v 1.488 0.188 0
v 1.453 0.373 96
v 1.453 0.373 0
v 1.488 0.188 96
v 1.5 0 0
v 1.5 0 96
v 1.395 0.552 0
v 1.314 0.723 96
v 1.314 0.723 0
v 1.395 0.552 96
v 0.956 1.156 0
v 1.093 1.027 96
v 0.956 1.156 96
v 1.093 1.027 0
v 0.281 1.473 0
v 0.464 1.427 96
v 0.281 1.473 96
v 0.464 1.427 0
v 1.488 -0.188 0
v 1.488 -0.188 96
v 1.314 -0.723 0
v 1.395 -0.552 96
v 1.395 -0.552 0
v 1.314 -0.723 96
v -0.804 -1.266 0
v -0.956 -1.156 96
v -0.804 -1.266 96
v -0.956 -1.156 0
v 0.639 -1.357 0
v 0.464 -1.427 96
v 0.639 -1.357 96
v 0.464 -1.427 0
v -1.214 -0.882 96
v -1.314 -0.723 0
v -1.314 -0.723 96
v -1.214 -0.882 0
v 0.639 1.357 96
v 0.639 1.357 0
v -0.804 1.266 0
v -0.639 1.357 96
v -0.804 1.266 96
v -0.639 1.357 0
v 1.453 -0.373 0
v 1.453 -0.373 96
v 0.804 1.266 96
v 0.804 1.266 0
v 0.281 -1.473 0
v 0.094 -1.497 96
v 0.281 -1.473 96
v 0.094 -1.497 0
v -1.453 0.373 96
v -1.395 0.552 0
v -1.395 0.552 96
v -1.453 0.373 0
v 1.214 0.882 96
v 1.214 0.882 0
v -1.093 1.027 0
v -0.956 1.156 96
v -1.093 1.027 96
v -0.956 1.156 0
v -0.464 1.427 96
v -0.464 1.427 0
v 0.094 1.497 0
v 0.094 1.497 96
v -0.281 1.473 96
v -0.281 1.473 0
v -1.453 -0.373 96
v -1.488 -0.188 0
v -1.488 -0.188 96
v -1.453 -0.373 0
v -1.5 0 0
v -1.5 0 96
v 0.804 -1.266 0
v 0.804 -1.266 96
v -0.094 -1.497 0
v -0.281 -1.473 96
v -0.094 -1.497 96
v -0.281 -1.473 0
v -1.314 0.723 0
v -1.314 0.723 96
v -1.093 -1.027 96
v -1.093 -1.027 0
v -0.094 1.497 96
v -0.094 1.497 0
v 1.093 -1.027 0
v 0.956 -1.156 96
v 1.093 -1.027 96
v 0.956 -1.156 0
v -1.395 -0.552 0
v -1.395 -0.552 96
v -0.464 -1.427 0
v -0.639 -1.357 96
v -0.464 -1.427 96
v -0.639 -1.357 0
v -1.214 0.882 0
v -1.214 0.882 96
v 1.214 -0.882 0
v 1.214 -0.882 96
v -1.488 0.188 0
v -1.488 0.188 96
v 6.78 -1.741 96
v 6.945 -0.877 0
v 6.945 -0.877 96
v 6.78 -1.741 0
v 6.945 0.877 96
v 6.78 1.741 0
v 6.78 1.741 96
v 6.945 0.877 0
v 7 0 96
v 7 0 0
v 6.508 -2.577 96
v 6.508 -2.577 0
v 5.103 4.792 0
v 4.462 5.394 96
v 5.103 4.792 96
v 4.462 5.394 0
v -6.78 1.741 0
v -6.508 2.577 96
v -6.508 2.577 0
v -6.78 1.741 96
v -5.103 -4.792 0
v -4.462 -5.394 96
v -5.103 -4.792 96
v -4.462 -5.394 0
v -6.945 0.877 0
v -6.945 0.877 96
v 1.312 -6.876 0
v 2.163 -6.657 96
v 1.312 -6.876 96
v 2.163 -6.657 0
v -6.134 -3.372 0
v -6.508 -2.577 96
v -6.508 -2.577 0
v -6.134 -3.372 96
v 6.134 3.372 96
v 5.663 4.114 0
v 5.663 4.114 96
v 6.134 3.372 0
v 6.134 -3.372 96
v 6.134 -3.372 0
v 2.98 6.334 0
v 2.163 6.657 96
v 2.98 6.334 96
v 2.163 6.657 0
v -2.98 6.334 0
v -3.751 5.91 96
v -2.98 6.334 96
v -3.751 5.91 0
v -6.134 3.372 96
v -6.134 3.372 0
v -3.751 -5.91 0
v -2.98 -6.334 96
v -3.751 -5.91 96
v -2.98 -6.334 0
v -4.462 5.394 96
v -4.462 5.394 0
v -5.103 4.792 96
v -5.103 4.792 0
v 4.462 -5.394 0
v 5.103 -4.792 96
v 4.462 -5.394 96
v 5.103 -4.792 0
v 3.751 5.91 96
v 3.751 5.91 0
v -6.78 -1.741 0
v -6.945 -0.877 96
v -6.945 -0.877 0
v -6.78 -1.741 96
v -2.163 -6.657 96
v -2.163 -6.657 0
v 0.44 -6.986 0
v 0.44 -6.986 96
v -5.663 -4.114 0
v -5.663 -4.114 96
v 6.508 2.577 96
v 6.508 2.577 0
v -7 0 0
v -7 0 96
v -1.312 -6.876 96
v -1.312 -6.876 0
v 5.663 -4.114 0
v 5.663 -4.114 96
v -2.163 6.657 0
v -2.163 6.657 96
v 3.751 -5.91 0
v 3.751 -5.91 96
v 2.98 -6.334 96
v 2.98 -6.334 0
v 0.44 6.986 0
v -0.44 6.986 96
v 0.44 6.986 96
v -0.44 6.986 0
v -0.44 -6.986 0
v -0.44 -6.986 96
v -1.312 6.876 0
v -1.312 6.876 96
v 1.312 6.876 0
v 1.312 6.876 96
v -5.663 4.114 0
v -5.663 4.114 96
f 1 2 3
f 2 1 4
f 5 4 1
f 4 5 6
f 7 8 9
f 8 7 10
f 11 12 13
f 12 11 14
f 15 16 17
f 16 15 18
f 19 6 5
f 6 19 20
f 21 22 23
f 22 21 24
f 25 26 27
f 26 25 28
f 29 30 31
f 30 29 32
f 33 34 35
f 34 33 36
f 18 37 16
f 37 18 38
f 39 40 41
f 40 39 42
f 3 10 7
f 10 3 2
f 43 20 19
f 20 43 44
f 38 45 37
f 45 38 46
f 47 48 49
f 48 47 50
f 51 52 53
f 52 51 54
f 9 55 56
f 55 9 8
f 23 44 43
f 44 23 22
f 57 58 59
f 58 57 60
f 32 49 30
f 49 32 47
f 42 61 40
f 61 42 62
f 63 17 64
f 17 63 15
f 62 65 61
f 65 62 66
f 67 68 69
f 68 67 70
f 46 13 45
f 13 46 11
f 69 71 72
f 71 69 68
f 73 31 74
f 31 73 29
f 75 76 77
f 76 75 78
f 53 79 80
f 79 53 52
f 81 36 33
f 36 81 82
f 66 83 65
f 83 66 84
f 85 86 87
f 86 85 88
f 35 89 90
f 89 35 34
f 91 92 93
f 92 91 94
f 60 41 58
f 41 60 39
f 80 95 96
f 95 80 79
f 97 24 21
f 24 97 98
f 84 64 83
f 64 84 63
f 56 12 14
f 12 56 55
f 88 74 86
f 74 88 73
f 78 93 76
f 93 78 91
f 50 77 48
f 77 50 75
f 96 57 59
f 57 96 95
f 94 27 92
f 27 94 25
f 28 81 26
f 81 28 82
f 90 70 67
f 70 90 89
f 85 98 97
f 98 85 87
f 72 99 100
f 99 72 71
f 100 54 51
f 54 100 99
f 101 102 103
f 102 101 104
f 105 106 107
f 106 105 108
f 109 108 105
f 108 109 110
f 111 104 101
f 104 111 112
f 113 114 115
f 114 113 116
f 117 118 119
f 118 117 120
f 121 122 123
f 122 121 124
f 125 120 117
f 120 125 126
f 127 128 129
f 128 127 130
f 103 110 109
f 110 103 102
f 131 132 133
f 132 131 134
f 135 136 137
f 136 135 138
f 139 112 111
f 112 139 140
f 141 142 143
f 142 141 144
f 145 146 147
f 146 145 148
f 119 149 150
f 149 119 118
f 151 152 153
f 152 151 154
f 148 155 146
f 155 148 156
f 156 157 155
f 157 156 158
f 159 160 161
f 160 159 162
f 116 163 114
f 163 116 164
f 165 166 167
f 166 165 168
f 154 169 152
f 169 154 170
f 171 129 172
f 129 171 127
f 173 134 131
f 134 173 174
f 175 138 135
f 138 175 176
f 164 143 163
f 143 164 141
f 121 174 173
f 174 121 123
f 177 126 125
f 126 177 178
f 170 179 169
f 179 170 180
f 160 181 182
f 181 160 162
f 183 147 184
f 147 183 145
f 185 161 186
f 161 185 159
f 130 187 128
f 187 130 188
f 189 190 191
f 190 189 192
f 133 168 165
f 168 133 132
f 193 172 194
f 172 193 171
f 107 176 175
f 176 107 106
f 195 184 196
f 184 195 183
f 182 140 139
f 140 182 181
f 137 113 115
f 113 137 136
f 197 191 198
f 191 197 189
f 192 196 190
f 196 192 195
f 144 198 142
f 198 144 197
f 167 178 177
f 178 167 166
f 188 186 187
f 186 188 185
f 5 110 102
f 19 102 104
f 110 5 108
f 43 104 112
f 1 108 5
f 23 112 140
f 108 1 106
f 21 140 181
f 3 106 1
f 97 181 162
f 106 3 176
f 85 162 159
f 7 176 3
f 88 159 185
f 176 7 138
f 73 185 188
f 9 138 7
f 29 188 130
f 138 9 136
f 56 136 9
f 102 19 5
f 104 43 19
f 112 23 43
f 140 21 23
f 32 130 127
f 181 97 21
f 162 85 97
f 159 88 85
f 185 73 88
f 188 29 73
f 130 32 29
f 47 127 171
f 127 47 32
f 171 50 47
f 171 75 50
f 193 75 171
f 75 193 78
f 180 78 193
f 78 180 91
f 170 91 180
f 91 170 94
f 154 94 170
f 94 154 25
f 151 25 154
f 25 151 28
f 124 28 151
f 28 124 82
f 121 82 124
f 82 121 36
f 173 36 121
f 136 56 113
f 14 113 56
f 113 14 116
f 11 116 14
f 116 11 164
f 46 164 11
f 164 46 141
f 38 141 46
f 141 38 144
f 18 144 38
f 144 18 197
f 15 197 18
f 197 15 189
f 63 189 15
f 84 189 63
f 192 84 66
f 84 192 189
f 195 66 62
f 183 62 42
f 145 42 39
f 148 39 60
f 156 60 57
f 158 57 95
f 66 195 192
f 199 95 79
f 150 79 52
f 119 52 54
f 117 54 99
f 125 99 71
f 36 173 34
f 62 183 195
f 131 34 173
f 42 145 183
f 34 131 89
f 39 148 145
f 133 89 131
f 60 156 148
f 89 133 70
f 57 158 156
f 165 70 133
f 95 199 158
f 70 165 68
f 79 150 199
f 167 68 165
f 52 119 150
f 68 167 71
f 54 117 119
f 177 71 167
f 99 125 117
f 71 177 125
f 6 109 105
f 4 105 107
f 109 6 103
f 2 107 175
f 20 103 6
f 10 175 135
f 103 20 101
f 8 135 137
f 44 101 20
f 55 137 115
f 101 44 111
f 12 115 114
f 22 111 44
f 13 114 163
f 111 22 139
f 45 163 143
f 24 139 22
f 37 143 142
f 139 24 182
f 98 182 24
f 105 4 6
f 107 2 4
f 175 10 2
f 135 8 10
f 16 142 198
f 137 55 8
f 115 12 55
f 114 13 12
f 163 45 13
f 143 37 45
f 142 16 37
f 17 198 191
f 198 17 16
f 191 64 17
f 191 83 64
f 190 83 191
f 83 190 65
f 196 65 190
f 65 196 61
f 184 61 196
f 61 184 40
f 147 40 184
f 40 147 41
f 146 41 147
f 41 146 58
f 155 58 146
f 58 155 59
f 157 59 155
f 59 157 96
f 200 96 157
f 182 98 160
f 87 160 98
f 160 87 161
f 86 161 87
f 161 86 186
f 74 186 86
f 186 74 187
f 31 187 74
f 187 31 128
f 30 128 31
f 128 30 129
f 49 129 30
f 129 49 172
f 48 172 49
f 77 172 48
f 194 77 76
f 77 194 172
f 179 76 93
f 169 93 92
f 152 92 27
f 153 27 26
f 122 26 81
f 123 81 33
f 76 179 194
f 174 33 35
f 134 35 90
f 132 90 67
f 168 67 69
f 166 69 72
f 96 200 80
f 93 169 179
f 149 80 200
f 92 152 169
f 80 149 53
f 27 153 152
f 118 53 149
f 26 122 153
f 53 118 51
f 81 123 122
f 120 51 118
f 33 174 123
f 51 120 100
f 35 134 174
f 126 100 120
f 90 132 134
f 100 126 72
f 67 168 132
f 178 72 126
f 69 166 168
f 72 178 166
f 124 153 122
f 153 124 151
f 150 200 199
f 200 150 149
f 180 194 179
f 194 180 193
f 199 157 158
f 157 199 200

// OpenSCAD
$fn = 50;


difference() {
	union() {
		cylinder(h = 96, r = 7.0000000000);
	}
	union() {
		translate(v = [0, 0, -100]) {
			cylinder(h = 200, r = 1.5000000000);
		}
		translate(v = [0, 0, -100]) {
			cylinder(h = 200, r = 1.5000000000);
		}
	}
}
